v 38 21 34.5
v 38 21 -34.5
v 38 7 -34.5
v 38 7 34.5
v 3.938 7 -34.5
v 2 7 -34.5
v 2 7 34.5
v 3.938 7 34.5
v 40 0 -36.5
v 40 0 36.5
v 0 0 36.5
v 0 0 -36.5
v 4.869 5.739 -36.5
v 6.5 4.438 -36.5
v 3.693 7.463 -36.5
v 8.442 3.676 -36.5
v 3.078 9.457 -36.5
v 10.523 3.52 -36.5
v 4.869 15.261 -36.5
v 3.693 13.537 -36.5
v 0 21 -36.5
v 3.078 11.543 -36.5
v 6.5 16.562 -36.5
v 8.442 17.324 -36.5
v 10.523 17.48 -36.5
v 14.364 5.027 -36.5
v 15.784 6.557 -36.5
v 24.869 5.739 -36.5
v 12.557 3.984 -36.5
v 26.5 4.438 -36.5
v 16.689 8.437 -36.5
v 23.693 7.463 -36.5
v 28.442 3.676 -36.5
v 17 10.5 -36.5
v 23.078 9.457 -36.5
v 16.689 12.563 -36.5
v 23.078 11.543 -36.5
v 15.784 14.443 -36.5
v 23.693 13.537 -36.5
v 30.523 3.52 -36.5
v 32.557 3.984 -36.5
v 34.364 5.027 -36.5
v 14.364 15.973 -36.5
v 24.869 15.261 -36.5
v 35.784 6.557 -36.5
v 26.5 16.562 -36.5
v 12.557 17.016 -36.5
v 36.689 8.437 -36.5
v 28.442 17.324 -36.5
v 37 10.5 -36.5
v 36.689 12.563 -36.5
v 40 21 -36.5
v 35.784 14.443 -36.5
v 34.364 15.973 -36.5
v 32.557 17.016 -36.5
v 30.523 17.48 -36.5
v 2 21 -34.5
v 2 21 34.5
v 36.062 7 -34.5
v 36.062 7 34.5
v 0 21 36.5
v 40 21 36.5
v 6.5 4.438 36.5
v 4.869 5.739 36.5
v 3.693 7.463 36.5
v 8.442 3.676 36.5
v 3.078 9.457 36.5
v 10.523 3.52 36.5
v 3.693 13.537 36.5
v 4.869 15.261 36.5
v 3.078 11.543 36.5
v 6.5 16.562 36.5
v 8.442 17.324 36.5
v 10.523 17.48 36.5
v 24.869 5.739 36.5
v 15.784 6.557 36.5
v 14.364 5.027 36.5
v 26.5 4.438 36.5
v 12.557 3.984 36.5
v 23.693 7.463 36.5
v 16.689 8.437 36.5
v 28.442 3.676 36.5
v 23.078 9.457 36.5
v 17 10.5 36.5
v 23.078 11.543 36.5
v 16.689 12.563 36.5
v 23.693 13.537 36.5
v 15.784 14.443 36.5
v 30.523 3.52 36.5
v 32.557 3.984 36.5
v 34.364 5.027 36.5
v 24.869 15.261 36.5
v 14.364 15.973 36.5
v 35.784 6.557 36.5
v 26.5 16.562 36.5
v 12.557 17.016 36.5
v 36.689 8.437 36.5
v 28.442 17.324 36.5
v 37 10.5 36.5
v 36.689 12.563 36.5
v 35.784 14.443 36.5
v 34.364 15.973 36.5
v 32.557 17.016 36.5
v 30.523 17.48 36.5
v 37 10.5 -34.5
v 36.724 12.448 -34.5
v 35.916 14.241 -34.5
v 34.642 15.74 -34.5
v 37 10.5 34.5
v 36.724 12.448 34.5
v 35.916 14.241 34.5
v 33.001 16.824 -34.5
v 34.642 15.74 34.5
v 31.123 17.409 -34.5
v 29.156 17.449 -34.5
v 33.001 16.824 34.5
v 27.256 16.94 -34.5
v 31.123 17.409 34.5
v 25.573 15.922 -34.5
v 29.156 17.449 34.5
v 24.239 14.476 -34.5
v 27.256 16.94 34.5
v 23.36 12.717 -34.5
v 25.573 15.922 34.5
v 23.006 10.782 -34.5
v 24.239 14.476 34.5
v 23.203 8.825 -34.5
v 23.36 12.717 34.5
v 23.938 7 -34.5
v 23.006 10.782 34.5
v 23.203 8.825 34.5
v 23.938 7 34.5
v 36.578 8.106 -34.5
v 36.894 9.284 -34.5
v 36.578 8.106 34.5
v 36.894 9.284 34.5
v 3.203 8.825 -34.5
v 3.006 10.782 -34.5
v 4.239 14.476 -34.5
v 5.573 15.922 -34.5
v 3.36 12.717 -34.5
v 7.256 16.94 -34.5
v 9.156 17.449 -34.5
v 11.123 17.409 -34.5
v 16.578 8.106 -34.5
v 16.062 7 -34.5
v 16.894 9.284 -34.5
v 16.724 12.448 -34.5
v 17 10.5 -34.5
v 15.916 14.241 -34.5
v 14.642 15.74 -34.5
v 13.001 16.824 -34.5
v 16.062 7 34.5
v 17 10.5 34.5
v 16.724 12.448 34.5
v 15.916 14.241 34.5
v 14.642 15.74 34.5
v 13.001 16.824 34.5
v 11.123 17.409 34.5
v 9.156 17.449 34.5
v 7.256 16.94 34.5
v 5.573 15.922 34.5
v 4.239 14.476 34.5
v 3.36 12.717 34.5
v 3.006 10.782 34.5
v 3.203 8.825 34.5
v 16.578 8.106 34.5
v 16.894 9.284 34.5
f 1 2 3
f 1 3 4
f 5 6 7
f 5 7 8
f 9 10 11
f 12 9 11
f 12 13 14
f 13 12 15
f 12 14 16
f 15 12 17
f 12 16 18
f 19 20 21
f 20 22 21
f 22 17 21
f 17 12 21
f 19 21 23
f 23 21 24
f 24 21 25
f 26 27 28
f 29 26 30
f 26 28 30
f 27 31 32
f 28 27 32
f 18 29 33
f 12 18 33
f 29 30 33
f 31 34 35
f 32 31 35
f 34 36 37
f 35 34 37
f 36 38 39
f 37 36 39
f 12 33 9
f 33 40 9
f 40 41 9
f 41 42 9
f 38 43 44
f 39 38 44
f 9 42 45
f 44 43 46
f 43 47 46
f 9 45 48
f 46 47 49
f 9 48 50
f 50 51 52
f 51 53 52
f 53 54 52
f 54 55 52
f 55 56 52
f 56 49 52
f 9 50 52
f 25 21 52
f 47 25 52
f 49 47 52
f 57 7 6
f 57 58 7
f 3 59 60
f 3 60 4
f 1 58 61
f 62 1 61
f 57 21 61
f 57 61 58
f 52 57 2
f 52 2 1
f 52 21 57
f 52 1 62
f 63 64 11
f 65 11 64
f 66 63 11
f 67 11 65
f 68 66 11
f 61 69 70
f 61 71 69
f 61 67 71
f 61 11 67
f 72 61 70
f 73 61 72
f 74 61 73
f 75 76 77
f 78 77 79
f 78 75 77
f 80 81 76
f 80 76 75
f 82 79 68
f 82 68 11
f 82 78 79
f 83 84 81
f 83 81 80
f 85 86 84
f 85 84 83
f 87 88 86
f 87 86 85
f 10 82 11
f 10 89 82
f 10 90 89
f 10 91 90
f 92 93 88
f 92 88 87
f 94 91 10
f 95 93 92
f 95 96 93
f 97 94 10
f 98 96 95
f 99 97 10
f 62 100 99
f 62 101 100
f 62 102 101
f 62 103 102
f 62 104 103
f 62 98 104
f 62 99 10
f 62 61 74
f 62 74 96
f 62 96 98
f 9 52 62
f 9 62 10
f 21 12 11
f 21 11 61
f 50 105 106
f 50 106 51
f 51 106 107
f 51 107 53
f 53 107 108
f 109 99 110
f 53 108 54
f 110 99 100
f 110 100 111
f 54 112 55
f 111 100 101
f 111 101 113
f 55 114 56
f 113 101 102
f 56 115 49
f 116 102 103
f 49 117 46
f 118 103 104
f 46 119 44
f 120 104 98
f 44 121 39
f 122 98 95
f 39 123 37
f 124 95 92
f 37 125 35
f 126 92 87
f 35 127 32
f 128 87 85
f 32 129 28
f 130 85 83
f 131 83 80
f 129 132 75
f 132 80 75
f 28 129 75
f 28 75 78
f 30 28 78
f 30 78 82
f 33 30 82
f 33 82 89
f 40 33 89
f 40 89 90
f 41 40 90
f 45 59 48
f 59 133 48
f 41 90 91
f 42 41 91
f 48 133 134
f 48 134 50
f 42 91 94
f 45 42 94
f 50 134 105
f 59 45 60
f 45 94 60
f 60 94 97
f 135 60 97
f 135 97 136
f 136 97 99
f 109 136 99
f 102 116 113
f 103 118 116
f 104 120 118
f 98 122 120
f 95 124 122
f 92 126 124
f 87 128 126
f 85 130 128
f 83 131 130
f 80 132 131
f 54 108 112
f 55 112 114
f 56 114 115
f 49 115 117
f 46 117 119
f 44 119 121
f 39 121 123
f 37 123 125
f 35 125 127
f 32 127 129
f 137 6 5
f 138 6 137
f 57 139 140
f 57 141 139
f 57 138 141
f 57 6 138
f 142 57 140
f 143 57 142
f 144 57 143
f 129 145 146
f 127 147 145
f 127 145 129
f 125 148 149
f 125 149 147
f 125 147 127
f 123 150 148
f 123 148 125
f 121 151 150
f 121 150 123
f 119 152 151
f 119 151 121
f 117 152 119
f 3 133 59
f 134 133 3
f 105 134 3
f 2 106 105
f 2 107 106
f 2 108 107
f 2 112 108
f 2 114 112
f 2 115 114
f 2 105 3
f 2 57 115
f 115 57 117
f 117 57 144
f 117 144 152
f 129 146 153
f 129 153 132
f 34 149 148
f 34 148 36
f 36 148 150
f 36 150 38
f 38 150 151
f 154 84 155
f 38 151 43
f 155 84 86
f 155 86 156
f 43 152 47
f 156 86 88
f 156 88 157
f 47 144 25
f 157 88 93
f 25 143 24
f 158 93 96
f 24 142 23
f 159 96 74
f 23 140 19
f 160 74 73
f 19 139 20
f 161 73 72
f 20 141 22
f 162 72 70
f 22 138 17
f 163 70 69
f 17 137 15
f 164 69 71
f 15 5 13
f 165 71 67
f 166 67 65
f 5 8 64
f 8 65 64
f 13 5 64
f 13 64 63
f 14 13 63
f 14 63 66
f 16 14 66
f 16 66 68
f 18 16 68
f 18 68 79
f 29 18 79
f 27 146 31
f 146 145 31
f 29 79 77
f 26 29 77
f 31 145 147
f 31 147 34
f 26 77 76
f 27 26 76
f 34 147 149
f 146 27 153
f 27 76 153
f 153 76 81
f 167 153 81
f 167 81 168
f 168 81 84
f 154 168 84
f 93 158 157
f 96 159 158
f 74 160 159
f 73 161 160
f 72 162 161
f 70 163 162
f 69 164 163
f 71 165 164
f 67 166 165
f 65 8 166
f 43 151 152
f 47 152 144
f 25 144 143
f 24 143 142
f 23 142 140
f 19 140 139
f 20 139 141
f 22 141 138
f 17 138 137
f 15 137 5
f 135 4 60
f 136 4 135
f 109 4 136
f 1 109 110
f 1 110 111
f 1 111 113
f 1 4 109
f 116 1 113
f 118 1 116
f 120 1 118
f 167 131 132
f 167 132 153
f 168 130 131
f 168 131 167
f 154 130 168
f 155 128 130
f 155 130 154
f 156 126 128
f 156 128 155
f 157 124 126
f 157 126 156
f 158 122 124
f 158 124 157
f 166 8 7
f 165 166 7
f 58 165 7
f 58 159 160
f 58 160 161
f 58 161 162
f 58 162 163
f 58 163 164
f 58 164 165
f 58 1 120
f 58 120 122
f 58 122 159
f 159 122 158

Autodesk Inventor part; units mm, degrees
ref_plane "YZ Plane" through (0, 0, 0) normal (1, 0, 0) x (0, 1, 0)
ref_plane "XZ Plane" through (0, 0, 0) normal (0, 1, 0) x (-1, 0, 0)
ref_plane "XY Plane" through (0, 0, 0) normal (0, 0, 1) x (1, 0, 0)
sketch "Esquisse1" plane through (0, 0, 0) normal (0, 0, 1) x (1, 0, 0)
  line L0 (0, 21) -> (40, 21)
  line L1 (40, 21) -> (40, 0)
  line L2 (40, 0) -> (0, 0)
  line L3 (0, 0) -> (0, 21)
  line L4 (-8, 0) -> (48, 0) projected
  line L5 (0, -4.2) -> (0, 25.2) projected
  point P0 (0, 0)
  dimension "d0" = 40
  dimension "d1" = 21
extrude "Extrusion1" add sketch "Esquisse1" along normal mid plane 73
sketch "Esquisse2" plane through (0, 0, 36.5) normal (0, 0, 1) x (1, 0, 0)
  circle A0 centre (10, 10.5) radius 7
  circle A1 centre (30, 10.5) radius 7
  line L0 (40, 21) -> (0, 21) projected
  line L1 (0, 21) -> (0, 0) projected
  line L2 (40, 0) -> (40, 21) projected
  line L3 (0, 0) -> (40, 0) projected
  dimension "d4" = 14
  dimension "d5" = 14
  dimension "d11" = 10.5
  dimension "d20" = 10.5
  dimension "d21" = 20
extrude "Extrusion2" cut sketch "Esquisse2" against normal through all contours A0 | A1
sketch "Esquisse3" plane through (0, 21, 36.5) normal (0, 1, 0) x (1, 0, 0)
  line L0 (2, 71) -> (38, 71)
  line L1 (38, 71) -> (38, 2)
  line L2 (38, 2) -> (2, 2)
  line L3 (2, 2) -> (2, 71)
  line L4 (0, 73) -> (40, 73) projected
  line L5 (40, 0) -> (0, 0) projected
  line L6 (40, 73) -> (40, 0) projected
  line L7 (0, 73) -> (0, 0) projected
  point P0 (0, 36.5)
  dimension "d14" = 2
  dimension "d15" = 2
  dimension "d16" = 2
  dimension "d17" = 2
extrude "Extrusion3" cut sketch "Esquisse3" against normal blind 14 contours L0 L1 L2 L3
equation "\"d5\" = d4"
equation "\"d11\" = d20"
equation "\"d15\" = d14"
equation "\"d16\" = d15"
equation "\"d17\" = d16"
properties part number "support pile"
